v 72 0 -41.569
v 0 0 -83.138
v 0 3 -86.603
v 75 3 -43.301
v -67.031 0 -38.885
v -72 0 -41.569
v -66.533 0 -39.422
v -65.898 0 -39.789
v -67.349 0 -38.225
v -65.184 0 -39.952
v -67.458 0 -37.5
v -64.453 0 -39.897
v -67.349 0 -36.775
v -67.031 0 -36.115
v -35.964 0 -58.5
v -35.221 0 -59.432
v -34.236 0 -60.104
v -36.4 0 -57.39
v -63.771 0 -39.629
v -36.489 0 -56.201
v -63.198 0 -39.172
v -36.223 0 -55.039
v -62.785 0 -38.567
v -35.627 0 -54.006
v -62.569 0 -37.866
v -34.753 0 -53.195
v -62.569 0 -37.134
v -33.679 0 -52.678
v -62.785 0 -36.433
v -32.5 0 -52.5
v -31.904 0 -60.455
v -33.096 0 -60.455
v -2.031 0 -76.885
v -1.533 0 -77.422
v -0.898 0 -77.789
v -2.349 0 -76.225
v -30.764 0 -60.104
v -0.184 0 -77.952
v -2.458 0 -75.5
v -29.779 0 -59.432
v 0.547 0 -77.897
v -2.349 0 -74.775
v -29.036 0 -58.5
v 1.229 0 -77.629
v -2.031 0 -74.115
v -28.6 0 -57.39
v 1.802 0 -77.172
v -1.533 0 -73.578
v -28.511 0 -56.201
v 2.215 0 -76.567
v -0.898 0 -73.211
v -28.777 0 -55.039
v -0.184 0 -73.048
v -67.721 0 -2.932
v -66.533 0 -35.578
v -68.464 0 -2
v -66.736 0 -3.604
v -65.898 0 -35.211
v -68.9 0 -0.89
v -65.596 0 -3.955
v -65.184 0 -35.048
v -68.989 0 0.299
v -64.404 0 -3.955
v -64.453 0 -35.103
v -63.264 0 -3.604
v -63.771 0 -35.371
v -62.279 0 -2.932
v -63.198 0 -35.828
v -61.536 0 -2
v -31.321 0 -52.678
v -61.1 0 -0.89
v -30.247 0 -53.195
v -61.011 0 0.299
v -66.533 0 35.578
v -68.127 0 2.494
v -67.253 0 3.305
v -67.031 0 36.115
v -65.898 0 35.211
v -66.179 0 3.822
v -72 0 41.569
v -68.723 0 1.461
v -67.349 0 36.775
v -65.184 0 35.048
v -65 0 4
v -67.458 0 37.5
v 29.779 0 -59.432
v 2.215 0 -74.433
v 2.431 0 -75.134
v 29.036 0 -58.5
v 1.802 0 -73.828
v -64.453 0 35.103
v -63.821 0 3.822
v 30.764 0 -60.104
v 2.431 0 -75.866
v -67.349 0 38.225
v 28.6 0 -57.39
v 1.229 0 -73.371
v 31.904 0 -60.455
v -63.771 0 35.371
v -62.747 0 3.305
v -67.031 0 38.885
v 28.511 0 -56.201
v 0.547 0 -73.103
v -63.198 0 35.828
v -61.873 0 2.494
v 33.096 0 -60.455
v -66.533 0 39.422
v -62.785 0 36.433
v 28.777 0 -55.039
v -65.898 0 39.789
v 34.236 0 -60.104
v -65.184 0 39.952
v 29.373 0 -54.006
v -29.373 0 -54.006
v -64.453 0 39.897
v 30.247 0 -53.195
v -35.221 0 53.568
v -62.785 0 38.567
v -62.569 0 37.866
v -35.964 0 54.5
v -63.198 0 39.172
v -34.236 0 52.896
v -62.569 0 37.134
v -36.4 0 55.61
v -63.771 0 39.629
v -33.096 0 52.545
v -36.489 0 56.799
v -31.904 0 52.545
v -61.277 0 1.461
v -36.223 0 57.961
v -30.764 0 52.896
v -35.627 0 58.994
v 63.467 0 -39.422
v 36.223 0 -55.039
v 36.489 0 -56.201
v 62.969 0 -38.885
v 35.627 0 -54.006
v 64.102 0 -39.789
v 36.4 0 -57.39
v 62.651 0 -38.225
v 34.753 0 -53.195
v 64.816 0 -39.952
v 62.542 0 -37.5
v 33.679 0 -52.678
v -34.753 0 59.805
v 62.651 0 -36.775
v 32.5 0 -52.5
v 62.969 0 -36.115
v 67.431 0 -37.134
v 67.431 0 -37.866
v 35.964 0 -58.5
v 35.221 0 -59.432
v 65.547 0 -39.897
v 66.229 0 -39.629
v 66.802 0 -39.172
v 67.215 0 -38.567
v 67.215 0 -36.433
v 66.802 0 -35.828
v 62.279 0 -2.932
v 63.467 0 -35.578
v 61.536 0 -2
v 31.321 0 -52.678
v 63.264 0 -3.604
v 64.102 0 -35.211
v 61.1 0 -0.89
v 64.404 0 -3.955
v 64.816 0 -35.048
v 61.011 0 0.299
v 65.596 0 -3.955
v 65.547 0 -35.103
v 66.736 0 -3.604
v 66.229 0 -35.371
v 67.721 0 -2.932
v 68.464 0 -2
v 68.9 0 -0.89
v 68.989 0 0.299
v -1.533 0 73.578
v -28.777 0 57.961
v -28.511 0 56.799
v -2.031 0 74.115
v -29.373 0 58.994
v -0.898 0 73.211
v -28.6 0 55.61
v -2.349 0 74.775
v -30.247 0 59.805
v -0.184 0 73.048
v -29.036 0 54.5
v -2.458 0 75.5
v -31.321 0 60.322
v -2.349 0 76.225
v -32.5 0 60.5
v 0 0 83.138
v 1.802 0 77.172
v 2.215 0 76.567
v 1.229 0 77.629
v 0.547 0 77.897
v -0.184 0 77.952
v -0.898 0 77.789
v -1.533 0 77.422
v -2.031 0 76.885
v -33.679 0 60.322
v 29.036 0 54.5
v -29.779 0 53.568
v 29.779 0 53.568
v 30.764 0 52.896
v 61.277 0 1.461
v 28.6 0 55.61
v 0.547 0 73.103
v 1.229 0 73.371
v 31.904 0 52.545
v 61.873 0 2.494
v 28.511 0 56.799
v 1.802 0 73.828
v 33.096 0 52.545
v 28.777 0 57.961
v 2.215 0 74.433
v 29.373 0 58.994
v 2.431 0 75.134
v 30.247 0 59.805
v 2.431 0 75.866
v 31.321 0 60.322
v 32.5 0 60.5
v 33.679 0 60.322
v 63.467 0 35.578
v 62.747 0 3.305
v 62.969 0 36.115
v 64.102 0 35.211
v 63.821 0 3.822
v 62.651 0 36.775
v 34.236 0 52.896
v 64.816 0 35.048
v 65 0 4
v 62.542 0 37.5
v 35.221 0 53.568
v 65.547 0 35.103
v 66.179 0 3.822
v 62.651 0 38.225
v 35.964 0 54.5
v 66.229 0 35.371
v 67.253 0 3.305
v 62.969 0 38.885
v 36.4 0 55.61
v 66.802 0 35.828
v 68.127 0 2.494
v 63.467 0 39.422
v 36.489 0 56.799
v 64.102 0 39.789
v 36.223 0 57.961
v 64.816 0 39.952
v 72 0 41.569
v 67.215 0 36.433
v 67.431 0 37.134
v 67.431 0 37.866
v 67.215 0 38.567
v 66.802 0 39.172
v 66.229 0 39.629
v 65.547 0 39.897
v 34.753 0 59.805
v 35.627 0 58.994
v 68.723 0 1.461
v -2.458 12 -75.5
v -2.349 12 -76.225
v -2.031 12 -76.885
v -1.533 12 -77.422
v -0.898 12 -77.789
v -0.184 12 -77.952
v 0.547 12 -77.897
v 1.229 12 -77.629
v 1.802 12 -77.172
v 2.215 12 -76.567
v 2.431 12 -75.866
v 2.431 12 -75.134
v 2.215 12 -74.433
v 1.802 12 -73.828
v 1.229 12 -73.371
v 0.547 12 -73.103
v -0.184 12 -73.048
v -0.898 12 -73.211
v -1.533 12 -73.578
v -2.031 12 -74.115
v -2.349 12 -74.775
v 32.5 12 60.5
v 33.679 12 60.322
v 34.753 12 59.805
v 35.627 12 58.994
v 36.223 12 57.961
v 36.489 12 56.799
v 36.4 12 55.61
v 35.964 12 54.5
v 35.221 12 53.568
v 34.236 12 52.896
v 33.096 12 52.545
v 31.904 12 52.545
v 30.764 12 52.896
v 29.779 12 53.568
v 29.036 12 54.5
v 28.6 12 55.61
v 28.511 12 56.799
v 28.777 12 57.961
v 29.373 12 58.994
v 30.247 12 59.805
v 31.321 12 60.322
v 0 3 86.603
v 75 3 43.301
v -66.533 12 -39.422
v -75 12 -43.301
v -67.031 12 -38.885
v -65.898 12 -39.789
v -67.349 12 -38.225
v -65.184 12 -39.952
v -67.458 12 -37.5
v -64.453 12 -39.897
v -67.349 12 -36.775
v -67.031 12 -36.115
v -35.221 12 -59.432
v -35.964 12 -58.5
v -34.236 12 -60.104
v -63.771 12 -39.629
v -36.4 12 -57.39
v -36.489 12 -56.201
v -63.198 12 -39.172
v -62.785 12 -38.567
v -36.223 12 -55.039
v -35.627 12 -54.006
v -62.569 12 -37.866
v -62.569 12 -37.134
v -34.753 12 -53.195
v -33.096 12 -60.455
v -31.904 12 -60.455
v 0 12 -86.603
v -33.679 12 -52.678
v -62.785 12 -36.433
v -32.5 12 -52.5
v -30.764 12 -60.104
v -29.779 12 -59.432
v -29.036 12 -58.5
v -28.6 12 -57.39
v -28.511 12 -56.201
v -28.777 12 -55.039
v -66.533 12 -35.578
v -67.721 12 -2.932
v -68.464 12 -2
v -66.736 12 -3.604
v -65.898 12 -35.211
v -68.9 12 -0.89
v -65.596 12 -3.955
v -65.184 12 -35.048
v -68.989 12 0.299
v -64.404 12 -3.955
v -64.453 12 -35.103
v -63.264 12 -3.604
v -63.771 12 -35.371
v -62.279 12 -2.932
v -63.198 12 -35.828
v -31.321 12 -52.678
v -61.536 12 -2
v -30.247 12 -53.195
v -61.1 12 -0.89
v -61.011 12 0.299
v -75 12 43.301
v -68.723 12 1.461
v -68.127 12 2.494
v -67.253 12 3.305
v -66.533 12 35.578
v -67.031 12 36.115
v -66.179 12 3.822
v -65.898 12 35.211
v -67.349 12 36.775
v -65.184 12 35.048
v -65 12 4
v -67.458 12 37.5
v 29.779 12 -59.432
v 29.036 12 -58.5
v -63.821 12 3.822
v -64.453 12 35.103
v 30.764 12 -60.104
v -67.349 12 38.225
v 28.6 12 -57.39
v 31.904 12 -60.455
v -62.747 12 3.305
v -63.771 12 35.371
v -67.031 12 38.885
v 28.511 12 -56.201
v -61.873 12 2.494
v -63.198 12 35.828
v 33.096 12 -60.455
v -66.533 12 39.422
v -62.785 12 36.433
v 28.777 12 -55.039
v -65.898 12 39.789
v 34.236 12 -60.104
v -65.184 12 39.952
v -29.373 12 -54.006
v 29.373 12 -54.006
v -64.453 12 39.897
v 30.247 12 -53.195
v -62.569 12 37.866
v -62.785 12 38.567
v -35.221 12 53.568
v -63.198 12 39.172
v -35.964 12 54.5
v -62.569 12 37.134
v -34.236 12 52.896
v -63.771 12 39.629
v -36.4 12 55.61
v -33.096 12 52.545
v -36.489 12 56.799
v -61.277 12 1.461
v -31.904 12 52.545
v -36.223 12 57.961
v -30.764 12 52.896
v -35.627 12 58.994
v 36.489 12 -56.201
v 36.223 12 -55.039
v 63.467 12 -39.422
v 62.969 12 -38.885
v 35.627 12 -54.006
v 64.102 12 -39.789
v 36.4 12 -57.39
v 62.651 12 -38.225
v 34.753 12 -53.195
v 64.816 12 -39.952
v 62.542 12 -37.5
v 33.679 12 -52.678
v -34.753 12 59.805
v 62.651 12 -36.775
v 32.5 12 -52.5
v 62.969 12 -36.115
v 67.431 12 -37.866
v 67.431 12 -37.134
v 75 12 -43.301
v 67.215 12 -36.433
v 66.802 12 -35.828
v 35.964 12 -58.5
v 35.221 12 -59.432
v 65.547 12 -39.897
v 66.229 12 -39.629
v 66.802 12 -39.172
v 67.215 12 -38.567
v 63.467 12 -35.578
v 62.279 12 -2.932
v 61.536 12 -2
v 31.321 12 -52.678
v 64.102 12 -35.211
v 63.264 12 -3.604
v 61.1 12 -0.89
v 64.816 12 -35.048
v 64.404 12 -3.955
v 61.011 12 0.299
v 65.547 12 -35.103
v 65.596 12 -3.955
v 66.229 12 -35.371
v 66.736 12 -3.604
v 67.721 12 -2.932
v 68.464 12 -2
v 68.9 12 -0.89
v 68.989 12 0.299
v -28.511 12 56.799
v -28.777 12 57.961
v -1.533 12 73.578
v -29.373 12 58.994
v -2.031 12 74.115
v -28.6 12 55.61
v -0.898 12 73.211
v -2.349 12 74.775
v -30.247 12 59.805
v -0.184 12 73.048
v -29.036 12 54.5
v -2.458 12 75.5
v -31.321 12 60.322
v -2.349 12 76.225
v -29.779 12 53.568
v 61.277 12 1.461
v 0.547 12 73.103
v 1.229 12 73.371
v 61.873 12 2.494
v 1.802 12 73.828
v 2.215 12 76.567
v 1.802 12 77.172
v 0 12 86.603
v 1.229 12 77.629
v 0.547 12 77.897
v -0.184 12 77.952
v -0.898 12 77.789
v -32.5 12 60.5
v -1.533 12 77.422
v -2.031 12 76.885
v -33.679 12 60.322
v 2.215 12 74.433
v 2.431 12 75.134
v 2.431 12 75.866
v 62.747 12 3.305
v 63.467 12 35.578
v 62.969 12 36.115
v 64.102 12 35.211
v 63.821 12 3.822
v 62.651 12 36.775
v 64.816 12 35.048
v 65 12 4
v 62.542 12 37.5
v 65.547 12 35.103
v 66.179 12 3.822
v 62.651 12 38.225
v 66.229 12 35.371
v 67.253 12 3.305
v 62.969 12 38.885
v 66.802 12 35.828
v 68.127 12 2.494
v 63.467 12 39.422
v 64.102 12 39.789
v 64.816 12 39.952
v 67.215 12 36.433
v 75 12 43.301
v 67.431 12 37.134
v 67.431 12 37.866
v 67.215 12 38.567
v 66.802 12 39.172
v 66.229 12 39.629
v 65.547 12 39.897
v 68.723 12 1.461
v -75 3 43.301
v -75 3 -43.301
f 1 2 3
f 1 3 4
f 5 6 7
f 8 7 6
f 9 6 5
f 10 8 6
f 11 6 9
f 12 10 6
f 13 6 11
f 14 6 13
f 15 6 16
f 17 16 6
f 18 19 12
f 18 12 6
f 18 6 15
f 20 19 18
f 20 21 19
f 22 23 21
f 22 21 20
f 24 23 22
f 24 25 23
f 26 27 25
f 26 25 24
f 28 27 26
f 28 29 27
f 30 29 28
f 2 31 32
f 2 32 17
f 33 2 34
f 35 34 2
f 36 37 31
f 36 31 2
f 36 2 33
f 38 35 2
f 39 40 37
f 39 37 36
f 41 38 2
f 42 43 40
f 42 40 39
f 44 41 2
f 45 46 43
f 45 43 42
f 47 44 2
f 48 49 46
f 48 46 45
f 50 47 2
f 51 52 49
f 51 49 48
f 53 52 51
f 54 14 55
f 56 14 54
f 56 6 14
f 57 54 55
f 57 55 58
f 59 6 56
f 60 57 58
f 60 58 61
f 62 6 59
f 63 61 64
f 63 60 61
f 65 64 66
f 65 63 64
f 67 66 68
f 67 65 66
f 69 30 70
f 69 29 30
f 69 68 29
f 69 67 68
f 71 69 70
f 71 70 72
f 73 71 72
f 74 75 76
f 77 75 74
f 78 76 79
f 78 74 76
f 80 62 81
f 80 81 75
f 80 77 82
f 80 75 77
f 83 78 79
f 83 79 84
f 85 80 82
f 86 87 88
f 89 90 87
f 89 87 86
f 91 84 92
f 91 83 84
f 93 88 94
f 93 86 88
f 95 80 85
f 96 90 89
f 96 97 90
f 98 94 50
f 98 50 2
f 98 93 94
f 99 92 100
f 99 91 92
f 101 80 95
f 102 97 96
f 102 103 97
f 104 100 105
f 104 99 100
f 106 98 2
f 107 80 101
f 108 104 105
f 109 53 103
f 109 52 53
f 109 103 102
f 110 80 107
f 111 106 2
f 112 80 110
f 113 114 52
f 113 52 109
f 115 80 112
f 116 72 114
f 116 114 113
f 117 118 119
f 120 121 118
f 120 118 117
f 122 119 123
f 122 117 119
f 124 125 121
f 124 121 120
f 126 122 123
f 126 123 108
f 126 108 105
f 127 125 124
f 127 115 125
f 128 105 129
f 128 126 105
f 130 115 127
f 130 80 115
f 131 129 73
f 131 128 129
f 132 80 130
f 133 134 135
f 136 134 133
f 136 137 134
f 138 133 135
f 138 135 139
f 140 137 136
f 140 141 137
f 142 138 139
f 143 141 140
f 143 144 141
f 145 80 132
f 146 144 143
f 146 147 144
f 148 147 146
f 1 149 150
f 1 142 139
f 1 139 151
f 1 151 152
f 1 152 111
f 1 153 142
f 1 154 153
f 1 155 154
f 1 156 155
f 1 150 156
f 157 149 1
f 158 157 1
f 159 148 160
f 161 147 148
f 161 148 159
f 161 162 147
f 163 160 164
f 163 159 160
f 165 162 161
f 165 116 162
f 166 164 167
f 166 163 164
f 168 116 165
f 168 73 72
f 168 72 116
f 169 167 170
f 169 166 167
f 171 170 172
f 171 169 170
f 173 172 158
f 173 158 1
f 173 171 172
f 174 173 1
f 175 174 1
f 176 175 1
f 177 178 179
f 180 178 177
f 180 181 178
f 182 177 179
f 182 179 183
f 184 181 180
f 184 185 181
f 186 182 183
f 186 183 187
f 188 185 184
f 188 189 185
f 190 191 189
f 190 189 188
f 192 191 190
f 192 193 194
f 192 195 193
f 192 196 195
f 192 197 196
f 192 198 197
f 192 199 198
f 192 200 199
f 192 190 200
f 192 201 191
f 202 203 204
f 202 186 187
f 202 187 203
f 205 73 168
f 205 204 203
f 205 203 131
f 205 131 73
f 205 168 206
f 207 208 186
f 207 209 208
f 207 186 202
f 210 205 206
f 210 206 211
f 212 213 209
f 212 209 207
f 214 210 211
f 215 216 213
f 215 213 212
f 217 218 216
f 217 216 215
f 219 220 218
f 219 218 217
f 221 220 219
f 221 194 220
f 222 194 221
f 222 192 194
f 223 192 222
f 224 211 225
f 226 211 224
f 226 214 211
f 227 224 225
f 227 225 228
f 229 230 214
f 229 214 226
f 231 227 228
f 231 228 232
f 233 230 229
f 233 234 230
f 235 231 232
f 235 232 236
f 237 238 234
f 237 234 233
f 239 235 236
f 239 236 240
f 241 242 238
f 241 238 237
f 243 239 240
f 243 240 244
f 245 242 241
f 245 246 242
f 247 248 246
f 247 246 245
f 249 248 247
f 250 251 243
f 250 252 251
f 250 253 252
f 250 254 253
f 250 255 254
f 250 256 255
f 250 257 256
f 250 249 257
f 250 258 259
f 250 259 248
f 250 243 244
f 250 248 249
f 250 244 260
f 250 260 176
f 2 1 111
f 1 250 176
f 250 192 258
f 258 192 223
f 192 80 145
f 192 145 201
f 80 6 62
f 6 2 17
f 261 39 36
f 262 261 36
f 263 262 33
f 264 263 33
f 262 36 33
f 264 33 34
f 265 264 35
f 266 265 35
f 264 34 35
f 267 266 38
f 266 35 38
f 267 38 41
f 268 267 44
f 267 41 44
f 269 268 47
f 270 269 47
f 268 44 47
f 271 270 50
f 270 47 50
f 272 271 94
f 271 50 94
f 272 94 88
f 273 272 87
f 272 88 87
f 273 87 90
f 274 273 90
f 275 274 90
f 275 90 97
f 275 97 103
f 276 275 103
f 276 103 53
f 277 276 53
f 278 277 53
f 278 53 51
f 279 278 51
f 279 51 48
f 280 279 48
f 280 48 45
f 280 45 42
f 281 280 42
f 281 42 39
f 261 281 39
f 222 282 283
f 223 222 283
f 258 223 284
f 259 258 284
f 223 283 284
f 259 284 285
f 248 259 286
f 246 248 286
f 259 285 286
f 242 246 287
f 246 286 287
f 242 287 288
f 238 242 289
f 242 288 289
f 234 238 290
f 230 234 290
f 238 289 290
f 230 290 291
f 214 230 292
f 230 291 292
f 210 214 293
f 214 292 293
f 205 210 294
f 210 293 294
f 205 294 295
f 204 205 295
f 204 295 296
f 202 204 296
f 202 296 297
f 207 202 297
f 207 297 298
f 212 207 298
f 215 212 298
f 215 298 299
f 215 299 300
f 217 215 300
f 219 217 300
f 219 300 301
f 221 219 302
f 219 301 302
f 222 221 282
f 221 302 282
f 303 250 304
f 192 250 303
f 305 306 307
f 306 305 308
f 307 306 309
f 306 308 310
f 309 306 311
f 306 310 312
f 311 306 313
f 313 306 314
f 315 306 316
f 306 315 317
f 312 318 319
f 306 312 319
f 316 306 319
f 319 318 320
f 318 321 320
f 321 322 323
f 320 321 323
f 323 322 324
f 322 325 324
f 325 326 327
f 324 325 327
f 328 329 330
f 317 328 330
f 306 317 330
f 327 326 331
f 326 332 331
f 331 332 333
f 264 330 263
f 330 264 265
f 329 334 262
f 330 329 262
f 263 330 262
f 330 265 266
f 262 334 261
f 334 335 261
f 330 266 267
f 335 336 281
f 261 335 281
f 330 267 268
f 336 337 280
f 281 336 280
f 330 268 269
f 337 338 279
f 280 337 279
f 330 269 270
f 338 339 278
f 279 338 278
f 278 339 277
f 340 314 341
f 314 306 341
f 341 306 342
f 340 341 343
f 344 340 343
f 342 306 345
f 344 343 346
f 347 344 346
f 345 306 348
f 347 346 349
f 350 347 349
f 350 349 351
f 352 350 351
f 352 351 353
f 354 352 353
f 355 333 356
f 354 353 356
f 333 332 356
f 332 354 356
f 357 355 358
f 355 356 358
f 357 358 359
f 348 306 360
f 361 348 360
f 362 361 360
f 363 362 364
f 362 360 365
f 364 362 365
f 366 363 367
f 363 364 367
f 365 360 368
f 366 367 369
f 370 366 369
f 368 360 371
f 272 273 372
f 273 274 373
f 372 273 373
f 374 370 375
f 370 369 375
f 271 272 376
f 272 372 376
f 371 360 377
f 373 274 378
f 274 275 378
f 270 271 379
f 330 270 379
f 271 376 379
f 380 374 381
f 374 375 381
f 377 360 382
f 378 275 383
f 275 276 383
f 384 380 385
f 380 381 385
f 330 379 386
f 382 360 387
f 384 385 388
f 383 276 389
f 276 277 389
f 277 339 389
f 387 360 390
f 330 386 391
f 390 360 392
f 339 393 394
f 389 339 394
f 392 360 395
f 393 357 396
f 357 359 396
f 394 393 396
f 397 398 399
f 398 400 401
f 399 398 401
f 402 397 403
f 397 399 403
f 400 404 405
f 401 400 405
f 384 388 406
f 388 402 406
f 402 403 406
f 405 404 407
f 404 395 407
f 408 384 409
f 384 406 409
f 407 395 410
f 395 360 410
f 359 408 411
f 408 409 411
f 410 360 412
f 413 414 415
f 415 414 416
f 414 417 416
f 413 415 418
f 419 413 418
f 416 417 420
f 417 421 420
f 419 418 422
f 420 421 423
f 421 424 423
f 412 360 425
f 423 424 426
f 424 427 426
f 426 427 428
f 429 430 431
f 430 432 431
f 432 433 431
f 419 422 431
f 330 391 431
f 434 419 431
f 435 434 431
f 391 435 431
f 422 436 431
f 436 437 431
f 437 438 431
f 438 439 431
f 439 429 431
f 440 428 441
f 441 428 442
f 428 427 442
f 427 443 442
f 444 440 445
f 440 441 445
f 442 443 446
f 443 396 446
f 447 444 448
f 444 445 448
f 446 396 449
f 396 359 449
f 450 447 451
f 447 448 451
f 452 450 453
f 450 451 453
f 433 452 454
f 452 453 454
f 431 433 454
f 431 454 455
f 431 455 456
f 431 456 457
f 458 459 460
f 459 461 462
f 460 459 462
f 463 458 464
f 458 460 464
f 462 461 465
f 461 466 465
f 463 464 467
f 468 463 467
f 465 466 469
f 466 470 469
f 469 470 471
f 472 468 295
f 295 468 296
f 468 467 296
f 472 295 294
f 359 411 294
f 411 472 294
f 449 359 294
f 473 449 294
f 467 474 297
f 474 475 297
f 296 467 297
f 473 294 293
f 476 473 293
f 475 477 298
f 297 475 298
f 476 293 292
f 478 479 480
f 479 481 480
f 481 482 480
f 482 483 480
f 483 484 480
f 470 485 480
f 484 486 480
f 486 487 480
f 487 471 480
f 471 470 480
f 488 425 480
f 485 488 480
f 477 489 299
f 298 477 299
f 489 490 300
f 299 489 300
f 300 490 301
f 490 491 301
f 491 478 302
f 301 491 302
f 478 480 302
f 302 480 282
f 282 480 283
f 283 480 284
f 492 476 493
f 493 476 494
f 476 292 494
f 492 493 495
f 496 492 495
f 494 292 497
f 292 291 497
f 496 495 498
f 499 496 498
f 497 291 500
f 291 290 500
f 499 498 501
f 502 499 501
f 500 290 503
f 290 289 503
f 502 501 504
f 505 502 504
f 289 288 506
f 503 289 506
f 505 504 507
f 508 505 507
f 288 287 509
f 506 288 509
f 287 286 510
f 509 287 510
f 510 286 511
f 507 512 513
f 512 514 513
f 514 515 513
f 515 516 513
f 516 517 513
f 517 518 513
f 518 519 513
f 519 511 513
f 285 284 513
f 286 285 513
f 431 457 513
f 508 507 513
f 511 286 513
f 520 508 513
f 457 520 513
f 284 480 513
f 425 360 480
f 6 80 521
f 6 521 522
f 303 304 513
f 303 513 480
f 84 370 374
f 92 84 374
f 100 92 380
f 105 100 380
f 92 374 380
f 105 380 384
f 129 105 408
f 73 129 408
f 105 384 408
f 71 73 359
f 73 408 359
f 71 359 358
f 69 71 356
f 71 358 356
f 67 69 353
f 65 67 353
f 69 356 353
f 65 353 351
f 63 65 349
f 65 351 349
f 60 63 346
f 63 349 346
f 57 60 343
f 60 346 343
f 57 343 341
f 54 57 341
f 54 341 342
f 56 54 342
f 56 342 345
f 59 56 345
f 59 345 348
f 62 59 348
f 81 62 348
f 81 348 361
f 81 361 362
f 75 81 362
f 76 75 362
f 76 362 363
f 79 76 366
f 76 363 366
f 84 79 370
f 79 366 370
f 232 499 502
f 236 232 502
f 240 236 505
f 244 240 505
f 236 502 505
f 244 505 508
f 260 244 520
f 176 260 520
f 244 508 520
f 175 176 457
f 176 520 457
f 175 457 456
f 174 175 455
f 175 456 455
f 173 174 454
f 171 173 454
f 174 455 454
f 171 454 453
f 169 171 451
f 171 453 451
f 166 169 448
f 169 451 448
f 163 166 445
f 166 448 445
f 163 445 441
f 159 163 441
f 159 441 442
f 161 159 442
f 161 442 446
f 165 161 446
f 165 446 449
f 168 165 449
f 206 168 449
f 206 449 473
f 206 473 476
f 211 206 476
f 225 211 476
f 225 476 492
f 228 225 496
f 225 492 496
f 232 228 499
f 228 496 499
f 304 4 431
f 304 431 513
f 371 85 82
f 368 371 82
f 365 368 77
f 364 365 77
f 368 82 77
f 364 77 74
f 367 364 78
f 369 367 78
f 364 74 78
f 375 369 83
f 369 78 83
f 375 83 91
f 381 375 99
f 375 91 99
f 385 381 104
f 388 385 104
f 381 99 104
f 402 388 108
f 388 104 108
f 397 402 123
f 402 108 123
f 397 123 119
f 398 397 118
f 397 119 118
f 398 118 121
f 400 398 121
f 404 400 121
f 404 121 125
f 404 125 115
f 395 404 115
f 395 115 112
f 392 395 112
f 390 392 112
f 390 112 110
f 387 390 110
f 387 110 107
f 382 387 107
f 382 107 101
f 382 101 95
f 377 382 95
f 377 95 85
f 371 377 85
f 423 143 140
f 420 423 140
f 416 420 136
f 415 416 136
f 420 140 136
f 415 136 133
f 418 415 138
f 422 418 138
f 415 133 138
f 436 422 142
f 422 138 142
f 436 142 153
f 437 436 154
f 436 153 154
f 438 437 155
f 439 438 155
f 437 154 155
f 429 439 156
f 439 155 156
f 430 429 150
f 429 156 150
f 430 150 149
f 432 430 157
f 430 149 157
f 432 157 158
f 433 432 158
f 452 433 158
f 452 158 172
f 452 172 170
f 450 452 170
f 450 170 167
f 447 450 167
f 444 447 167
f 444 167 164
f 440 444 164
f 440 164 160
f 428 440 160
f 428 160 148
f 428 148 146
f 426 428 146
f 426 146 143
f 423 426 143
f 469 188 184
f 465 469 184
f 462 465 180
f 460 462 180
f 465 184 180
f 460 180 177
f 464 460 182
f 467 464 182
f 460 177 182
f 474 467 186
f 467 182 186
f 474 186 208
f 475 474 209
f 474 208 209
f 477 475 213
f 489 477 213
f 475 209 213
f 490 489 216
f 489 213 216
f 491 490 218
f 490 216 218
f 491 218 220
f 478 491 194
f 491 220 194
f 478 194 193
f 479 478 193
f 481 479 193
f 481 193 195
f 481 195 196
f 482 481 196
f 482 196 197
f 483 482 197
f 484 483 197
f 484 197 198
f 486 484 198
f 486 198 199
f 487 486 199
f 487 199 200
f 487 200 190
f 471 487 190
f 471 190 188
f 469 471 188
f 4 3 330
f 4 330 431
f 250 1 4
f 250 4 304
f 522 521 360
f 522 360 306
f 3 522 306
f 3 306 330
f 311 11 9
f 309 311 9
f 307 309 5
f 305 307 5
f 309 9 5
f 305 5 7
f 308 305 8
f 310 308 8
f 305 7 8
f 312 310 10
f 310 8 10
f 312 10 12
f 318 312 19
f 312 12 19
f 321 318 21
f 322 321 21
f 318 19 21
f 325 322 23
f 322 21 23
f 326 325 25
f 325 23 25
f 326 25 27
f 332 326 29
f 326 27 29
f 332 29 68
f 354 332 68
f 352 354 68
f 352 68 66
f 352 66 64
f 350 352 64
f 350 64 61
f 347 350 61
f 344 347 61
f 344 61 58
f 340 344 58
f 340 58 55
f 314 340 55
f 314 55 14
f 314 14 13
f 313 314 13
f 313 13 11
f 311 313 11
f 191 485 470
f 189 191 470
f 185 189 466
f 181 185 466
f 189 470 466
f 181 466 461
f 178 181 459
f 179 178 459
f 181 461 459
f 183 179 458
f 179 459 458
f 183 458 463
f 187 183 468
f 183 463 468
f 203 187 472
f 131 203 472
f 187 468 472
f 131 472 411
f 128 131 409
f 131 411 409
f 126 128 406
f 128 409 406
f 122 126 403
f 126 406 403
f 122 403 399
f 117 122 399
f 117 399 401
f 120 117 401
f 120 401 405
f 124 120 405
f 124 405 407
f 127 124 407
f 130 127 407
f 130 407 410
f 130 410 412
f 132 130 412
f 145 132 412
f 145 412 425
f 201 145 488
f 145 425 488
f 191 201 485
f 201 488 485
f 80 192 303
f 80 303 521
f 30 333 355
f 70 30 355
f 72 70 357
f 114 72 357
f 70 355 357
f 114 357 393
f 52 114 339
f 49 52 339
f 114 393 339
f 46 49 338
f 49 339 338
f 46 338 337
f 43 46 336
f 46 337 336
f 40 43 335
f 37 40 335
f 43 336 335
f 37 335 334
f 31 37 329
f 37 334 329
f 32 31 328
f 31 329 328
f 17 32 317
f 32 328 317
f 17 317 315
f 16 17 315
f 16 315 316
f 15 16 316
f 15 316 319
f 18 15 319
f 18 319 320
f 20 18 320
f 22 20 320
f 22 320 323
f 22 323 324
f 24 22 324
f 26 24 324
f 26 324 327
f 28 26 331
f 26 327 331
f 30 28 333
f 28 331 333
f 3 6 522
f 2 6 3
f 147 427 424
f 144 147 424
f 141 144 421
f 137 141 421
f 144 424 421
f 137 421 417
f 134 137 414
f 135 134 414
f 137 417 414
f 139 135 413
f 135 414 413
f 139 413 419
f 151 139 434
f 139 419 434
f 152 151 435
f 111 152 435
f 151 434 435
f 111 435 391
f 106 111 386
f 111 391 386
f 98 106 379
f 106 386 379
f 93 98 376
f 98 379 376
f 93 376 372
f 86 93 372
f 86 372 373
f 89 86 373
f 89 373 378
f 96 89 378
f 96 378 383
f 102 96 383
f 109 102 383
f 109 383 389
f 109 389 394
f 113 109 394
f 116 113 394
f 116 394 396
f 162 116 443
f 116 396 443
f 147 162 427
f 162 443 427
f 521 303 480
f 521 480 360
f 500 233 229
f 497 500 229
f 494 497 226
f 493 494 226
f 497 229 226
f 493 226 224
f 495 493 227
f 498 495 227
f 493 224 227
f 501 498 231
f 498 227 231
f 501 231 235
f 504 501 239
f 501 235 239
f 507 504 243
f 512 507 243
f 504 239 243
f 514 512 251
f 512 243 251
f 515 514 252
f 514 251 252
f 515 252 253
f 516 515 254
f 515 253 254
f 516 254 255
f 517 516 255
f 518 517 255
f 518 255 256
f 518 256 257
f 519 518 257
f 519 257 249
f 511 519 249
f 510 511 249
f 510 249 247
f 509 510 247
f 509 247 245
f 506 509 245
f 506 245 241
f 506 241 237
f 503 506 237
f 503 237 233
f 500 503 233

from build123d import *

# Parameters (mm, degrees)
EXTRUDE_1_DEPTH     = 12
CHAMFER_1_SIZE      = 3
SKETCH_2_R          = 4
EXTRUDE_2_DEPTH     = 12
HOLE_WIZARD_1_D     = 4.917
HOLE_WIZARD_1_DEPTH = 17.1
HOLE_WIZARD_1_TIP   = 1.477215832


with BuildPart() as part:
    # 草圖1 → 擠出1 (new body)
    with BuildSketch(Plane(origin=(0, 0, 0), x_dir=(-1, 0, 0), z_dir=(0, 1, 0))):
        Polygon((0, -86.602540378), (-75, -43.301270189), (-75, 43.301270189), (0, 86.602540378), (75, 43.301270189), (75, -43.301270189), align=None)
    extrude(amount=EXTRUDE_1_DEPTH)

    # 倒角1
    chamfer_1_edges = [part.edges().sort_by_distance(p)[0] for p in [
        (37.5, 0, -64.951905284),
        (75, 0, 0),
        (37.5, 0, 64.951905284),
        (-37.5, 0, 64.951905284),
        (-75, 0, 0),
        (-37.5, 0, -64.951905284),
    ]]
    chamfer(chamfer_1_edges, length=CHAMFER_1_SIZE)

    # 草圖2 → 擠出2 (cut)
    with BuildSketch(Plane(origin=(0, 12, 0), x_dir=(-1, 0, 0), z_dir=(0, 1, 0))):
        with Locations(Location((-32.5, 56.5, 0), (0, 0, 90))):
            Circle(SKETCH_2_R)
        with Locations(Location((32.5, 56.5, 0), (0, 0, 90))):
            Circle(SKETCH_2_R)
        with Locations(Location((-65, 0, 0), (0, 0, 90))):
            Circle(SKETCH_2_R)
        with Locations(Location((-32.5, -56.5, 0), (0, 0, 90))):
            Circle(SKETCH_2_R)
        with Locations(Location((32.5, -56.5, 0), (0, 0, 90))):
            Circle(SKETCH_2_R)
        with Locations(Location((65, 0, 0), (0, 0, 90))):
            Circle(SKETCH_2_R)
    extrude(amount=-EXTRUDE_2_DEPTH, mode=Mode.SUBTRACT)

    # 孔1
    with Locations(Plane(origin=(0, 12, 0), x_dir=(1, 0, 0), z_dir=(0, 1, 0))):
        with Locations((0, 75.5), (-65, 37.5), (65, 37.5), (-65, -37.5), (65, -37.5), (0, -75.5)):
            Hole(HOLE_WIZARD_1_D / 2, depth=HOLE_WIZARD_1_DEPTH)
            with Locations((0, 0, -(HOLE_WIZARD_1_DEPTH + HOLE_WIZARD_1_TIP / 2))):  # 118° drill point
                Cone(0, HOLE_WIZARD_1_D / 2, HOLE_WIZARD_1_TIP, mode=Mode.SUBTRACT)


solid = part.part
